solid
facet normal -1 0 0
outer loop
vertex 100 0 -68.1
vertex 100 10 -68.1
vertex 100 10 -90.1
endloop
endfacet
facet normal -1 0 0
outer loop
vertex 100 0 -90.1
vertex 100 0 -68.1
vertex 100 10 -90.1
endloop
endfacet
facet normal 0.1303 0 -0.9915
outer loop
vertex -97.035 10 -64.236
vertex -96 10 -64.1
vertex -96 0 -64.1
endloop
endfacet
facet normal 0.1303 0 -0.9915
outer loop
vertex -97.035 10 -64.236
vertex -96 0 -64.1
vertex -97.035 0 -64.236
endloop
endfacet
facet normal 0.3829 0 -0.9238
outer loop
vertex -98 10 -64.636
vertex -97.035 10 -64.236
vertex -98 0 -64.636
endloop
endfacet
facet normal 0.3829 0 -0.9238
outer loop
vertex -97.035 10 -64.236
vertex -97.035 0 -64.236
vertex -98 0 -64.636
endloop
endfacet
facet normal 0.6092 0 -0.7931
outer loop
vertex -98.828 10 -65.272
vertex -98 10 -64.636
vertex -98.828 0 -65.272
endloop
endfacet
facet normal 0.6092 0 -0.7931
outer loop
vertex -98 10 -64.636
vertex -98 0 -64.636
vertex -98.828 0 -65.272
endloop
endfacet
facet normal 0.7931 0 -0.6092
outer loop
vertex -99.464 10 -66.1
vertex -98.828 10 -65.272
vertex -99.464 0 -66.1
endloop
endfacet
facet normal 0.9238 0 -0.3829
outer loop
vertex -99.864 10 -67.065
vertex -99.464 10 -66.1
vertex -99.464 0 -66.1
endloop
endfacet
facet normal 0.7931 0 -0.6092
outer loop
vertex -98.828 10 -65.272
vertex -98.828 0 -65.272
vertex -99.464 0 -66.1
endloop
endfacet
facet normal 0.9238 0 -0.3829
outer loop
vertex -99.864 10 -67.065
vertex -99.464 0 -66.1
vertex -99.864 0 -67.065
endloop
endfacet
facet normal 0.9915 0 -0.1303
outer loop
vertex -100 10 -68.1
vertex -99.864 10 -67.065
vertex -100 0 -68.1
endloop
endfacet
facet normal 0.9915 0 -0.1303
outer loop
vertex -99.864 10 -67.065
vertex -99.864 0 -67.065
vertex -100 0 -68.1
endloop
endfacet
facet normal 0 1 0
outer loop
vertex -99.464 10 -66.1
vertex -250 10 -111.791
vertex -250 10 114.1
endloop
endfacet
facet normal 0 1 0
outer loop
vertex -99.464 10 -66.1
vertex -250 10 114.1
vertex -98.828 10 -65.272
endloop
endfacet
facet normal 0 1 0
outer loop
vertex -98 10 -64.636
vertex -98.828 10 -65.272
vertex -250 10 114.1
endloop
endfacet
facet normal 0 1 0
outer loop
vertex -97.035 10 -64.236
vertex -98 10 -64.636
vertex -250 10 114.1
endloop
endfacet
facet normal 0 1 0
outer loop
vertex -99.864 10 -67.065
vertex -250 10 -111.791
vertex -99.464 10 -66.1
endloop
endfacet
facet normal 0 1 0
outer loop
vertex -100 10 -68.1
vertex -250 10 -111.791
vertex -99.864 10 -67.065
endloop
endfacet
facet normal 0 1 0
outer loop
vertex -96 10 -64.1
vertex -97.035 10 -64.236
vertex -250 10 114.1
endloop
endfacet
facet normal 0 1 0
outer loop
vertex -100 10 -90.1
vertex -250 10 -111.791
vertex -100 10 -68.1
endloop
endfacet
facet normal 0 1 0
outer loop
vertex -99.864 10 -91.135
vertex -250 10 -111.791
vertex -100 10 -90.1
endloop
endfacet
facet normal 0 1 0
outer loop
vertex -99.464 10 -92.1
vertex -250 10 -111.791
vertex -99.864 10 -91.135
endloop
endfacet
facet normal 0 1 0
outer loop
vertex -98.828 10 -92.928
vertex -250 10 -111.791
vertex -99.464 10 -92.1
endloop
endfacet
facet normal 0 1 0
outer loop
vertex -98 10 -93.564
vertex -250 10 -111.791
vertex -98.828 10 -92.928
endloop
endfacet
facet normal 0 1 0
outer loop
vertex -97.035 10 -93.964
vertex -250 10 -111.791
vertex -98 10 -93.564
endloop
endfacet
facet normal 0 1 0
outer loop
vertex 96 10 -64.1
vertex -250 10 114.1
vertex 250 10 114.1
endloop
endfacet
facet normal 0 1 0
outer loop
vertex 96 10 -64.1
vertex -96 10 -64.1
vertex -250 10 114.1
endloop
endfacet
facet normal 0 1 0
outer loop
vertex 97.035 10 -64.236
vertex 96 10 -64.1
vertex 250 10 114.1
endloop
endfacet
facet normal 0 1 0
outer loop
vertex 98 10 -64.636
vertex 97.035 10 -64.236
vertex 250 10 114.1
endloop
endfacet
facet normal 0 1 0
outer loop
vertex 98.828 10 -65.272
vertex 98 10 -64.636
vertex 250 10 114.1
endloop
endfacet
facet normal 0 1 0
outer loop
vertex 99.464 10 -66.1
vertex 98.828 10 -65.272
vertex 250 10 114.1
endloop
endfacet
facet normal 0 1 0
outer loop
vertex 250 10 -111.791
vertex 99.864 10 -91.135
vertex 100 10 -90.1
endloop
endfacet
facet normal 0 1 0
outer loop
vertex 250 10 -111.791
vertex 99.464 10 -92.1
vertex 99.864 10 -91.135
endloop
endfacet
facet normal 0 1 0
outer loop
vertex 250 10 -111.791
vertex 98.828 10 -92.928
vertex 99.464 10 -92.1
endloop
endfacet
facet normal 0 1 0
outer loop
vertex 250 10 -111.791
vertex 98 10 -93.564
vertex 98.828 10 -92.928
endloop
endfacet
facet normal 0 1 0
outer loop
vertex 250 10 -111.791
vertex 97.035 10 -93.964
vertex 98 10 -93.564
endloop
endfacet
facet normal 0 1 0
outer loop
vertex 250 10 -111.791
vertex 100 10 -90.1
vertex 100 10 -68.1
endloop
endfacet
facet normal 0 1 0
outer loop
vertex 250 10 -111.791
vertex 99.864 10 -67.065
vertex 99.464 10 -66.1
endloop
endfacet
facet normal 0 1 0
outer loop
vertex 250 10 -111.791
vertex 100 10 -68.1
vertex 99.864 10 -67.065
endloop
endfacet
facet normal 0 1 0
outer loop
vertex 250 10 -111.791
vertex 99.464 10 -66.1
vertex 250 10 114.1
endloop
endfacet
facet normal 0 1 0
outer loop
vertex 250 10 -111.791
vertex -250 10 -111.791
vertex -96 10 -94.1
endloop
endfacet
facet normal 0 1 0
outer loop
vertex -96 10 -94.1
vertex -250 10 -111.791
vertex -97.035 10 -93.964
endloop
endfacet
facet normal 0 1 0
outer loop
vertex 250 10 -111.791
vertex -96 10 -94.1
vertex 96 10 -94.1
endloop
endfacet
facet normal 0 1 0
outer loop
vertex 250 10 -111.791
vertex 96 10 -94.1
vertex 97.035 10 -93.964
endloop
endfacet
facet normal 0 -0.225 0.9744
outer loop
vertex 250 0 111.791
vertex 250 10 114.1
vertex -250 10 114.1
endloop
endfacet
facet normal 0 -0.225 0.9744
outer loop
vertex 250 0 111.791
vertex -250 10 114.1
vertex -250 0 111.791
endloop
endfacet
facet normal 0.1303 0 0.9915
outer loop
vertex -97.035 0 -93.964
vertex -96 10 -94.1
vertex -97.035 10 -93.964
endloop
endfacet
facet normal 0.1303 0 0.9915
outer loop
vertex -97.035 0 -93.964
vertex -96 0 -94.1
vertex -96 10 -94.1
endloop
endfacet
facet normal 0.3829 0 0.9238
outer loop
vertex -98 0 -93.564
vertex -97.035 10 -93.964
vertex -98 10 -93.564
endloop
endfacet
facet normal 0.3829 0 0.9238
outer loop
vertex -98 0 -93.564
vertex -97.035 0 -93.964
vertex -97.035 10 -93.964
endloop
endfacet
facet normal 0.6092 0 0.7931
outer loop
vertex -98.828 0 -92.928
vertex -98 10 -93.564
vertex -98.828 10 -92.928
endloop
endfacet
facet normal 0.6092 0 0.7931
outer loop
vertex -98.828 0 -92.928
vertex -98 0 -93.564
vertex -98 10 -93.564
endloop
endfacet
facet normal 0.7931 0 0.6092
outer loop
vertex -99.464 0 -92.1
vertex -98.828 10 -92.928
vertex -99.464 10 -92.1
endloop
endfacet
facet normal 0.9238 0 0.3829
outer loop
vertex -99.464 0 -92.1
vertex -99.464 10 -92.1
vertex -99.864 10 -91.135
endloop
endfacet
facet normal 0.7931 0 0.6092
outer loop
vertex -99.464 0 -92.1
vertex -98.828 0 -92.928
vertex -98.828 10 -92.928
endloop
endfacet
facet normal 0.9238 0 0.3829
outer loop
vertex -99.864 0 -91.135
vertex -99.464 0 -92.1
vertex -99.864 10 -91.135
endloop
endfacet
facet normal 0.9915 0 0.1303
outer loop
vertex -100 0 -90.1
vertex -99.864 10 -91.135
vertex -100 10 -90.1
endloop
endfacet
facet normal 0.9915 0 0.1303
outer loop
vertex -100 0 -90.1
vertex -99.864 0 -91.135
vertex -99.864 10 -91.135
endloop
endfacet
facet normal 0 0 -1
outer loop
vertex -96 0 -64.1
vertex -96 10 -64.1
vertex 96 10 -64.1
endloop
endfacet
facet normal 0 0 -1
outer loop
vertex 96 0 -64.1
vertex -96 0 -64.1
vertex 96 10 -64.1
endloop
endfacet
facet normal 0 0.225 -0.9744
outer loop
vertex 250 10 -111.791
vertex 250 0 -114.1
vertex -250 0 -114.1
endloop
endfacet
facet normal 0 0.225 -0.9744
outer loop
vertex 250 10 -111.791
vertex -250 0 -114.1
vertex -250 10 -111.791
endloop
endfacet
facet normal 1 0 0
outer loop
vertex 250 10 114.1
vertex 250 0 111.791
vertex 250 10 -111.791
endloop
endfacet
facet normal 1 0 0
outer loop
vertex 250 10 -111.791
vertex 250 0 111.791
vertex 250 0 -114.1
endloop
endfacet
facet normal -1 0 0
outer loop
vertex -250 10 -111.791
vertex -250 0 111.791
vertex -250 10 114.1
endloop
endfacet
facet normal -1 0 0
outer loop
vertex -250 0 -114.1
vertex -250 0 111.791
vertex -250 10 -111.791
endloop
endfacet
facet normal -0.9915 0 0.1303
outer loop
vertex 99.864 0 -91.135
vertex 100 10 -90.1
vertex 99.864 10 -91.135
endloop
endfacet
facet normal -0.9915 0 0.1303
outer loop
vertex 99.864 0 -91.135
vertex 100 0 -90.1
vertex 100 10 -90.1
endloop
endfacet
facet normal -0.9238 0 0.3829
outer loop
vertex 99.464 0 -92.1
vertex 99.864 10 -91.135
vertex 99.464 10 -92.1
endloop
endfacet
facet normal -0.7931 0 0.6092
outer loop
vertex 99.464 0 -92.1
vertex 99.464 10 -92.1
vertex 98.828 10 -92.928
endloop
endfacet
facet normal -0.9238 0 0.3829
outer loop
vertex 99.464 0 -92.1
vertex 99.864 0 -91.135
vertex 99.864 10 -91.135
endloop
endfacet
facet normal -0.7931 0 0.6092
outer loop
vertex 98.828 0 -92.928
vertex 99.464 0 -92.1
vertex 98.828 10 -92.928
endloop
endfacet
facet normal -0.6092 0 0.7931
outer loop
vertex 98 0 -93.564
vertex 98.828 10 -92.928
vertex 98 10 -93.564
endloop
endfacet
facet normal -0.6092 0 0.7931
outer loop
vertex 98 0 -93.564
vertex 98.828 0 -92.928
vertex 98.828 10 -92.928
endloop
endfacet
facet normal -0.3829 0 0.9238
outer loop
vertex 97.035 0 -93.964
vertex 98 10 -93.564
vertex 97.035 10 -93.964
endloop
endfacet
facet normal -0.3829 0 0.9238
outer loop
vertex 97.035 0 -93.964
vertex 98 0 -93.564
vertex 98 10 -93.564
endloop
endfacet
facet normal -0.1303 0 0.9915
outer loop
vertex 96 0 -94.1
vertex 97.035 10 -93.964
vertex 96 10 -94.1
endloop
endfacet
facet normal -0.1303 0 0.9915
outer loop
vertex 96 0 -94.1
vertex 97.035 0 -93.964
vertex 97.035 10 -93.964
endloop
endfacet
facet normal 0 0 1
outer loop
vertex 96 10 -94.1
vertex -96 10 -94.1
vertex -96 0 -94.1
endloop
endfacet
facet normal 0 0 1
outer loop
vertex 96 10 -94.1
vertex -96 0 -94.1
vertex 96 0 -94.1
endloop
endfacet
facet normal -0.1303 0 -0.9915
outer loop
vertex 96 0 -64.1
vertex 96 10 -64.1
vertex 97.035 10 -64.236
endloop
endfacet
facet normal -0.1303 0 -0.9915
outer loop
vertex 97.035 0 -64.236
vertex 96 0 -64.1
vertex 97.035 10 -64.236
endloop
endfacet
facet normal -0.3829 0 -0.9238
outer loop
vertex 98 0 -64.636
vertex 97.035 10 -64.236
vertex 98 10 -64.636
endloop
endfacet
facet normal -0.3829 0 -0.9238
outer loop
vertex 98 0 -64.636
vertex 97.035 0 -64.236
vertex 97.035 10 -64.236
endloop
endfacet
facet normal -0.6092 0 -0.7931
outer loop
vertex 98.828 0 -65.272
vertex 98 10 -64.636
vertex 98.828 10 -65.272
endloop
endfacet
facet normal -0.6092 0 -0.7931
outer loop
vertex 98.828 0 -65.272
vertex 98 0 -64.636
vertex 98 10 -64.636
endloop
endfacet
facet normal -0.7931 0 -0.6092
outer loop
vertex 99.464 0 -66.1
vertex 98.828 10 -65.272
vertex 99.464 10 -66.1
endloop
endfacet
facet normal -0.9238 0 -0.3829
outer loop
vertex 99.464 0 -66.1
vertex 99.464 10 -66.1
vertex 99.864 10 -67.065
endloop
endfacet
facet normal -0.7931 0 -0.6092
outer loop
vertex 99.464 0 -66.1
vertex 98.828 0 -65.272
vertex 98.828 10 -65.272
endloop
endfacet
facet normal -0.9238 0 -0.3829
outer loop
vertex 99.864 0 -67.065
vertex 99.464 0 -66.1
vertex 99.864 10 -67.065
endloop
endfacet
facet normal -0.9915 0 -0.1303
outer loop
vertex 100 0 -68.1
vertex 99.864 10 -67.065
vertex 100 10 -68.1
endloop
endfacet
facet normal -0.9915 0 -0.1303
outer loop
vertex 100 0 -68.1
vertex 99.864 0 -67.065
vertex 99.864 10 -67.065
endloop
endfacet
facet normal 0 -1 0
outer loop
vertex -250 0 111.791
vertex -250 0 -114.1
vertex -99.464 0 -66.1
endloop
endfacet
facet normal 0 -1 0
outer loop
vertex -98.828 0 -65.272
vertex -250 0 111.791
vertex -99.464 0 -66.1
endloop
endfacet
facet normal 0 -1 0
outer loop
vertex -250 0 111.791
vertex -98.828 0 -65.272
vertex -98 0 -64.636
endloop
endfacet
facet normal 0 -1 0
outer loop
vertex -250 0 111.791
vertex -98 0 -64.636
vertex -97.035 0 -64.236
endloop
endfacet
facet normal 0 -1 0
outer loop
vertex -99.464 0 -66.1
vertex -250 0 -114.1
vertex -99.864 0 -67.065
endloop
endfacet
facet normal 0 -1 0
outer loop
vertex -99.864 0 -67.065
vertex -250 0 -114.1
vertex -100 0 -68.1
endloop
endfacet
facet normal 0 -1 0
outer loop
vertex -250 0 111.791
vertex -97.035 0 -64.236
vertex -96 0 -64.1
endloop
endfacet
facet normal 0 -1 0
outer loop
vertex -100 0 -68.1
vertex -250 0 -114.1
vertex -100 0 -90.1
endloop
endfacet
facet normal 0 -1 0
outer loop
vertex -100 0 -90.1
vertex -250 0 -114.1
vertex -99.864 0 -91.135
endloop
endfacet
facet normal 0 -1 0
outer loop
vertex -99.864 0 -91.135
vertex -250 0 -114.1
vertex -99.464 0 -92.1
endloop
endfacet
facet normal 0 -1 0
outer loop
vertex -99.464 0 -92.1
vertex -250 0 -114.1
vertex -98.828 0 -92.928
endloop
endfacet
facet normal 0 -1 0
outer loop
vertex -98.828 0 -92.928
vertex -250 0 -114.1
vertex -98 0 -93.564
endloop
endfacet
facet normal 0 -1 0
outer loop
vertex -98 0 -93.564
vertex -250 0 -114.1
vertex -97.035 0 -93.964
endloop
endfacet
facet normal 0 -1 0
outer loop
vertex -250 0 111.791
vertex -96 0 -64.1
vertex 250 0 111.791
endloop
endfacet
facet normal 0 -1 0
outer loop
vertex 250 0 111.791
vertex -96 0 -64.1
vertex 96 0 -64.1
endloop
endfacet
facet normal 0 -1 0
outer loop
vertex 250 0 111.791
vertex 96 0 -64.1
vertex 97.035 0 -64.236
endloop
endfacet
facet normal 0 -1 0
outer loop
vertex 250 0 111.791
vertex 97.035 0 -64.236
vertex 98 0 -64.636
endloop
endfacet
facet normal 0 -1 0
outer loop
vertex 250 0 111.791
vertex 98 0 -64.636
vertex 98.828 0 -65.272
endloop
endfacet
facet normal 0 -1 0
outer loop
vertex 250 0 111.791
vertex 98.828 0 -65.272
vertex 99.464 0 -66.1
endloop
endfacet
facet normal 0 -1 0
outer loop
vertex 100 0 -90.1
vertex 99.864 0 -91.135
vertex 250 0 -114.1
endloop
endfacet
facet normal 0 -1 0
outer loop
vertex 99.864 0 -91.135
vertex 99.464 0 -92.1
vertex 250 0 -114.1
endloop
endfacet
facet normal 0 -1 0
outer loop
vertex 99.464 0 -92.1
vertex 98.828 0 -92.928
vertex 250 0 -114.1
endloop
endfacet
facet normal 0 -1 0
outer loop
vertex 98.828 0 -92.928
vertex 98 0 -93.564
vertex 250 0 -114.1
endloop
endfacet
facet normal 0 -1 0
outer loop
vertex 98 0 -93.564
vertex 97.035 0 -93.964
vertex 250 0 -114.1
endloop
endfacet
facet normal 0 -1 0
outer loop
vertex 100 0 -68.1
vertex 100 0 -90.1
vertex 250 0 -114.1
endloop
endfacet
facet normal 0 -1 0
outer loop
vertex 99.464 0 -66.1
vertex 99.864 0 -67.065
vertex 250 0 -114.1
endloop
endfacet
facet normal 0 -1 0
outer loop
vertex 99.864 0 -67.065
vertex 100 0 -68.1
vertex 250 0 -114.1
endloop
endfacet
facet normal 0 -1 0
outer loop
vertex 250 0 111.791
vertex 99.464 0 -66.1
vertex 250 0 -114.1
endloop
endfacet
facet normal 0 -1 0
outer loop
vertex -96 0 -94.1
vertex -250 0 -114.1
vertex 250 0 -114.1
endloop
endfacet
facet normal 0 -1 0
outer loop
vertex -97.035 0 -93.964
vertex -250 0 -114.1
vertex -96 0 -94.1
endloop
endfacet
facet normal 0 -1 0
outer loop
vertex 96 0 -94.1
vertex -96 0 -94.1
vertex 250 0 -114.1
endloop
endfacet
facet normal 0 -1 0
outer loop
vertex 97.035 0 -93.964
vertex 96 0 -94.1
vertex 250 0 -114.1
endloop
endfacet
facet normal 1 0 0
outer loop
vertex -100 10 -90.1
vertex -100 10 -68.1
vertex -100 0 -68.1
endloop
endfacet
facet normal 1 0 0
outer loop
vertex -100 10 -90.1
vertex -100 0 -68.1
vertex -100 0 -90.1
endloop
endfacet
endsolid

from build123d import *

# Parameters (mm, degrees)
SKETCH2_W           = 500
SKETCH2_H           = 228.2
BOSS_EXTRUDE1_DEPTH = 10
SKETCH3_W           = 200
SKETCH3_H           = 30
CUT_EXTRUDE1_DEPTH  = 10
FILLET1_R           = 4
CUT_EXTRUDE2_REACH  = 502


with BuildPart() as part:
    # Sketch2 → Boss-Extrude1 (new body)
    with BuildSketch(Plane(origin=(0, 0, 0), x_dir=(1, 0, 0), z_dir=(0, 1, 0))):
        Rectangle(SKETCH2_W, SKETCH2_H)
    extrude(amount=BOSS_EXTRUDE1_DEPTH)

    # Sketch3 → Cut-Extrude1 (cut)
    with BuildSketch(Plane(origin=(0, 10, 0), x_dir=(1, 0, 0), z_dir=(0, 1, 0))):
        with Locations((0, 79.1)):
            Rectangle(SKETCH3_W, SKETCH3_H)
    extrude(amount=-CUT_EXTRUDE1_DEPTH, mode=Mode.SUBTRACT)

    # Fillet1
    fillet1_edges = [part.edges().sort_by_distance(p)[0] for p in [
        (100, 5, -94.1),
        (100, 5, -64.1),
        (-100, 5, -64.1),
        (-100, 5, -94.1),
    ]]
    fillet(fillet1_edges, radius=FILLET1_R)

    # Sketch4 → Cut-Extrude2 (cut, up to next)
    with BuildSketch(Plane(origin=(250, 0, 0), x_dir=(0, 0, -1), z_dir=(1, 0, 0)), mode=Mode.PRIVATE) as cut_extrude2_sk1:
        Polygon((114.1, 0), (111.791318089, 10), (114.1, 10), align=None)
    cut_extrude2_tool1 = extrude(cut_extrude2_sk1.sketch, amount=-CUT_EXTRUDE2_REACH, mode=Mode.PRIVATE) & part.part
    add(cut_extrude2_tool1.solids().sort_by_distance((250, 6.666667, -113.330439))[0], mode=Mode.SUBTRACT)
    # Sketch4 → Cut-Extrude2 (cut, up to next)
    with BuildSketch(Plane(origin=(250, 0, 0), x_dir=(0, 0, -1), z_dir=(1, 0, 0)), mode=Mode.PRIVATE) as cut_extrude2_sk2:
        Polygon((-114.1, 0), (-114.1, 10), (-111.791318089, 0), align=None)
    cut_extrude2_tool2 = extrude(cut_extrude2_sk2.sketch, amount=-CUT_EXTRUDE2_REACH, mode=Mode.PRIVATE) & part.part
    add(cut_extrude2_tool2.solids().sort_by_distance((250, 3.333333, 113.330439))[0], mode=Mode.SUBTRACT)


solid = part.part
